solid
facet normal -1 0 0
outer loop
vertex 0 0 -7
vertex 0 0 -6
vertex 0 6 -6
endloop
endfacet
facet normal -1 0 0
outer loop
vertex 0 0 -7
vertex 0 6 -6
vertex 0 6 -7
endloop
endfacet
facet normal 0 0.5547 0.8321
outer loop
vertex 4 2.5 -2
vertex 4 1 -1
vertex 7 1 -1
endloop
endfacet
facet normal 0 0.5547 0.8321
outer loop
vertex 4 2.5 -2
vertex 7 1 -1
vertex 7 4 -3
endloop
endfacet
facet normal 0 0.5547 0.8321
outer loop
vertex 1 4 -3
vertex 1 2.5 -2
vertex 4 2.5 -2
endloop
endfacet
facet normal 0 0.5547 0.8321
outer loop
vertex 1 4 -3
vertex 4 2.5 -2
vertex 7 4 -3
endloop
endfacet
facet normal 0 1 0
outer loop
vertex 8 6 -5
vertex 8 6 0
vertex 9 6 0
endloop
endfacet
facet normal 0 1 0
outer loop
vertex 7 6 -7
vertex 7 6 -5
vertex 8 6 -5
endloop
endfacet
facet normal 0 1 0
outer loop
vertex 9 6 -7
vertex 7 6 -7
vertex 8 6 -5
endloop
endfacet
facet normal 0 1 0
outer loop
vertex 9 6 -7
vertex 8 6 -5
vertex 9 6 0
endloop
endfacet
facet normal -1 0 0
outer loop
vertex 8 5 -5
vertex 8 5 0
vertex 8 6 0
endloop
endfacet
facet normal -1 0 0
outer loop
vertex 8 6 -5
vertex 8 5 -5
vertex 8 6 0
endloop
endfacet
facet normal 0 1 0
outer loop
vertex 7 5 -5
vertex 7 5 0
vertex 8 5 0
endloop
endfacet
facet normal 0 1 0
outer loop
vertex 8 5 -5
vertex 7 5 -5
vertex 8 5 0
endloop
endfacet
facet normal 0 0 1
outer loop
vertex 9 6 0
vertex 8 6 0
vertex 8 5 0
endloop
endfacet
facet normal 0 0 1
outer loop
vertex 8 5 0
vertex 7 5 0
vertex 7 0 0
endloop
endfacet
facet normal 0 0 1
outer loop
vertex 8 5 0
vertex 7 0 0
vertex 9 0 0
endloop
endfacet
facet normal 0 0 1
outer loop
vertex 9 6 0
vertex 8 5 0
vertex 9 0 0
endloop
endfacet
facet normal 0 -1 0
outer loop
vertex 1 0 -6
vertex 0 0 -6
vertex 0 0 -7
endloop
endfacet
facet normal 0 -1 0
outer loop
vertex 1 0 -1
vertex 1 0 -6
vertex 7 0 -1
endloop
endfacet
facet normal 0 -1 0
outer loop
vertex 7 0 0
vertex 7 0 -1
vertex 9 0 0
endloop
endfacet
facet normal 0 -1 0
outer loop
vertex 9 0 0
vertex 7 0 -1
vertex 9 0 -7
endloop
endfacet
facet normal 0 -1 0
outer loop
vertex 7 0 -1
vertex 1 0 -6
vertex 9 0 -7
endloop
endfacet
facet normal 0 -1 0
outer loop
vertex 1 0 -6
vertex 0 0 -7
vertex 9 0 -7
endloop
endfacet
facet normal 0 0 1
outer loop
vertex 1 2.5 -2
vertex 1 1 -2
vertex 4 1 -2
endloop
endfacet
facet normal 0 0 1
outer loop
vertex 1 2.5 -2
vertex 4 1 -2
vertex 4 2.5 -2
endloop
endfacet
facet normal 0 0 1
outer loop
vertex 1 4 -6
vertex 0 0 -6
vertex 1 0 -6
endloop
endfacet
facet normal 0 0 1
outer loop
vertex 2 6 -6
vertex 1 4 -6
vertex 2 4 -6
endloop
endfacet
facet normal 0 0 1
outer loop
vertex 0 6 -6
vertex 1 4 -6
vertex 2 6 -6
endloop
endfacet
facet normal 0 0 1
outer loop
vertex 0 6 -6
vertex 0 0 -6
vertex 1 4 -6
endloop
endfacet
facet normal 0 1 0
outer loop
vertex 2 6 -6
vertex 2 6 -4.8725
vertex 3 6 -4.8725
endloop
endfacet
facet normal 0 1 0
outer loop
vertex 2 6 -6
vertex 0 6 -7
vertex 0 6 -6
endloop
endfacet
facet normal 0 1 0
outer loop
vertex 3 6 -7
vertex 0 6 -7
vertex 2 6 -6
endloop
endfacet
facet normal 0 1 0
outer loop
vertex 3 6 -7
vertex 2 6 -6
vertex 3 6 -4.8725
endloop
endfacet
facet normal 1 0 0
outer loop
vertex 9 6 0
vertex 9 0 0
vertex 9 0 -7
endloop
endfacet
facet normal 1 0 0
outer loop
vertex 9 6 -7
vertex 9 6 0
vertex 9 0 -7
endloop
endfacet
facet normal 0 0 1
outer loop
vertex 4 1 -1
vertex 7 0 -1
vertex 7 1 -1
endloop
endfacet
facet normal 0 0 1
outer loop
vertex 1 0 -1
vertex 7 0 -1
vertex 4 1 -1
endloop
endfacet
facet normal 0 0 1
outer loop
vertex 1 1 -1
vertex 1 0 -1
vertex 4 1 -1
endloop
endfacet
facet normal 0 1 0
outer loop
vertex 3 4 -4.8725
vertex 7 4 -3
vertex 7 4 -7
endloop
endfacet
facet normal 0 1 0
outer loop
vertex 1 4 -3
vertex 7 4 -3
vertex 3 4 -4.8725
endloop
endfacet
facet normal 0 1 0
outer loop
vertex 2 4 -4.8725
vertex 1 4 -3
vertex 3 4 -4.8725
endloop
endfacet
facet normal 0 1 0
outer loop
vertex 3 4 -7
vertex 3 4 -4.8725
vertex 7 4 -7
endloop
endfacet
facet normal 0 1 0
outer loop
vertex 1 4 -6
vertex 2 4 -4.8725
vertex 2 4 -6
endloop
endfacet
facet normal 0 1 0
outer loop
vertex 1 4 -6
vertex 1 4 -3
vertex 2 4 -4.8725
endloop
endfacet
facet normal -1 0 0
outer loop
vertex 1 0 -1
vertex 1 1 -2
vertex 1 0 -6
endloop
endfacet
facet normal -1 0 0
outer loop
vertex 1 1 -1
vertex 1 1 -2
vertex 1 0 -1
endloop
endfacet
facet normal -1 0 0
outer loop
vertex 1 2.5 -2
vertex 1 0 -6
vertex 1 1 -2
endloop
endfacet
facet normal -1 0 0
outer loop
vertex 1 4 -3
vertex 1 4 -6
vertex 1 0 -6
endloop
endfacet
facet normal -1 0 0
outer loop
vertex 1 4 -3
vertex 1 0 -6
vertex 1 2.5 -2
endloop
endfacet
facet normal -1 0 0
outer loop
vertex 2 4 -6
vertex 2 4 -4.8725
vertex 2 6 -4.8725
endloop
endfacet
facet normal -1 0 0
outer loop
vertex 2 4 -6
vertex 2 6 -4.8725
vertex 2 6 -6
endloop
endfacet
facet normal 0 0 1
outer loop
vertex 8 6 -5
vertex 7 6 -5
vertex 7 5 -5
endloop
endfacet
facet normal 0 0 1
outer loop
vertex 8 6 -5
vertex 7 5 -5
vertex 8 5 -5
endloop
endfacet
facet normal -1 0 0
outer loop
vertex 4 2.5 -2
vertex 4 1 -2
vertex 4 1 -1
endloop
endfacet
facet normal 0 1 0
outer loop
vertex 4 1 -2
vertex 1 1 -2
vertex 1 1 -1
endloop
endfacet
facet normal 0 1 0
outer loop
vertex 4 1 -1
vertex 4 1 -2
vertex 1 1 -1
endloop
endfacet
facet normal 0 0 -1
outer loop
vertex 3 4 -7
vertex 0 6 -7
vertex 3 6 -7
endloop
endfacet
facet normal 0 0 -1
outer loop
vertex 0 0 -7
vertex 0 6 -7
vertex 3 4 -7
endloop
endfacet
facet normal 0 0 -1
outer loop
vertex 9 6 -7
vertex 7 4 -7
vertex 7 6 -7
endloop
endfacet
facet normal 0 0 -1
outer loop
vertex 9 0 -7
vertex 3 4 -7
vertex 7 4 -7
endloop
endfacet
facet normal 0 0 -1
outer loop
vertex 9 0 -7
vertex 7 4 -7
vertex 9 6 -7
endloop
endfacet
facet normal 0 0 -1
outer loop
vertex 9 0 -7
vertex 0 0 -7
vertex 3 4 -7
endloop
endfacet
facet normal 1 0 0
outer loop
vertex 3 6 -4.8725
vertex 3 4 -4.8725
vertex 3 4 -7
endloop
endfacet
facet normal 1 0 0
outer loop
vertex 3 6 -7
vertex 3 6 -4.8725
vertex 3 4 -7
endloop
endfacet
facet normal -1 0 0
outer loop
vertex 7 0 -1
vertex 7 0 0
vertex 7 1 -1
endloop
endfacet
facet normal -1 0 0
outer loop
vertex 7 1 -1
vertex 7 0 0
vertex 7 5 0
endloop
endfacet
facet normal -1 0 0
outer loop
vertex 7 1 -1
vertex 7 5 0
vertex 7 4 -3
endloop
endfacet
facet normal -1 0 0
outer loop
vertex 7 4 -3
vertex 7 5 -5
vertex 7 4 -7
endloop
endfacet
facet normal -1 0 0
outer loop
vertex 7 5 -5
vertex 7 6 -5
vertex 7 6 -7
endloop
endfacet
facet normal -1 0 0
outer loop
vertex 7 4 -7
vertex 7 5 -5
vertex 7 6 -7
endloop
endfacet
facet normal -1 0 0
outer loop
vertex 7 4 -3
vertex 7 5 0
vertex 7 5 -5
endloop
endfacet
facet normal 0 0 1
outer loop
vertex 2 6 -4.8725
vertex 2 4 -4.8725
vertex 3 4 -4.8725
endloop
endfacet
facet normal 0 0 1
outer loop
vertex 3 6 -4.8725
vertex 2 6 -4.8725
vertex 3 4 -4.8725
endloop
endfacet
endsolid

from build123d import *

# Parameters (mm, degrees)
SKETCH1_W           = 9
SKETCH1_H           = 7
BOSS_EXTRUDE1_DEPTH = 6
CUT_EXTRUDE1_DEPTH  = 7
SKETCH3_W           = 5
SKETCH3_H           = 4
CUT_EXTRUDE2_DEPTH  = 1
SKETCH4_W           = 1
SKETCH4_H           = 1
CUT_EXTRUDE3_DEPTH  = 5
SKETCH5_W           = 1
SKETCH5_H           = 1.5
CUT_EXTRUDE4_DEPTH  = 3
SKETCH6_W           = 4
SKETCH6_H           = 1
CUT_EXTRUDE5_DEPTH  = 2
SKETCH7_W           = 1
SKETCH7_H           = 1.127539311
BOSS_EXTRUDE2_DEPTH = 2


with BuildPart() as part:
    # Sketch1 → Boss-Extrude1 (new body)
    with BuildSketch(Plane(origin=(0, 0, 0), x_dir=(1, 0, 0), z_dir=(0, 1, 0))):
        with Locations((4.5, 3.5)):
            Rectangle(SKETCH1_W, SKETCH1_H)
    extrude(amount=BOSS_EXTRUDE1_DEPTH)

    # Sketch2 → Cut-Extrude1 (cut)
    with BuildSketch(Plane.ZY):
        Polygon((0, 0), (-1, 0), (-1, 1), (-3, 4), (-6, 4), (-6, 6), (0, 6), align=None)
    extrude(amount=-CUT_EXTRUDE1_DEPTH, mode=Mode.SUBTRACT)

    # Sketch3 → Cut-Extrude2 (cut)
    with BuildSketch(Plane.ZY):
        with Locations((-3.5, 2)):
            Rectangle(SKETCH3_W, SKETCH3_H)
    extrude(amount=-CUT_EXTRUDE2_DEPTH, mode=Mode.SUBTRACT)

    # Sketch4 → Cut-Extrude3 (cut)
    with BuildSketch(Plane.XY):
        with Locations((7.5, 5.5)):
            Rectangle(SKETCH4_W, SKETCH4_H)
    extrude(amount=-CUT_EXTRUDE3_DEPTH, mode=Mode.SUBTRACT)

    # Sketch5 → Cut-Extrude4 (cut)
    with BuildSketch(Plane.ZY.offset(-1)):
        with Locations((-1.5, 1.75)):
            Rectangle(SKETCH5_W, SKETCH5_H)
    extrude(amount=-CUT_EXTRUDE4_DEPTH, mode=Mode.SUBTRACT)

    # Sketch6 → Cut-Extrude5 (cut)
    with BuildSketch(Plane(origin=(0, 6, 0), x_dir=(1, 0, 0), z_dir=(0, 1, 0))):
        with Locations((5, 6.5)):
            Rectangle(SKETCH6_W, SKETCH6_H)
    extrude(amount=-CUT_EXTRUDE5_DEPTH, mode=Mode.SUBTRACT)

    # Sketch7 → Boss-Extrude2 (add)
    with BuildSketch(Plane(origin=(0, 4, 0), x_dir=(1, 0, 0), z_dir=(0, 1, 0))):
        with Locations((2.5, 5.436230345)):
            Rectangle(SKETCH7_W, SKETCH7_H)
    extrude(amount=BOSS_EXTRUDE2_DEPTH)


solid = part.part
